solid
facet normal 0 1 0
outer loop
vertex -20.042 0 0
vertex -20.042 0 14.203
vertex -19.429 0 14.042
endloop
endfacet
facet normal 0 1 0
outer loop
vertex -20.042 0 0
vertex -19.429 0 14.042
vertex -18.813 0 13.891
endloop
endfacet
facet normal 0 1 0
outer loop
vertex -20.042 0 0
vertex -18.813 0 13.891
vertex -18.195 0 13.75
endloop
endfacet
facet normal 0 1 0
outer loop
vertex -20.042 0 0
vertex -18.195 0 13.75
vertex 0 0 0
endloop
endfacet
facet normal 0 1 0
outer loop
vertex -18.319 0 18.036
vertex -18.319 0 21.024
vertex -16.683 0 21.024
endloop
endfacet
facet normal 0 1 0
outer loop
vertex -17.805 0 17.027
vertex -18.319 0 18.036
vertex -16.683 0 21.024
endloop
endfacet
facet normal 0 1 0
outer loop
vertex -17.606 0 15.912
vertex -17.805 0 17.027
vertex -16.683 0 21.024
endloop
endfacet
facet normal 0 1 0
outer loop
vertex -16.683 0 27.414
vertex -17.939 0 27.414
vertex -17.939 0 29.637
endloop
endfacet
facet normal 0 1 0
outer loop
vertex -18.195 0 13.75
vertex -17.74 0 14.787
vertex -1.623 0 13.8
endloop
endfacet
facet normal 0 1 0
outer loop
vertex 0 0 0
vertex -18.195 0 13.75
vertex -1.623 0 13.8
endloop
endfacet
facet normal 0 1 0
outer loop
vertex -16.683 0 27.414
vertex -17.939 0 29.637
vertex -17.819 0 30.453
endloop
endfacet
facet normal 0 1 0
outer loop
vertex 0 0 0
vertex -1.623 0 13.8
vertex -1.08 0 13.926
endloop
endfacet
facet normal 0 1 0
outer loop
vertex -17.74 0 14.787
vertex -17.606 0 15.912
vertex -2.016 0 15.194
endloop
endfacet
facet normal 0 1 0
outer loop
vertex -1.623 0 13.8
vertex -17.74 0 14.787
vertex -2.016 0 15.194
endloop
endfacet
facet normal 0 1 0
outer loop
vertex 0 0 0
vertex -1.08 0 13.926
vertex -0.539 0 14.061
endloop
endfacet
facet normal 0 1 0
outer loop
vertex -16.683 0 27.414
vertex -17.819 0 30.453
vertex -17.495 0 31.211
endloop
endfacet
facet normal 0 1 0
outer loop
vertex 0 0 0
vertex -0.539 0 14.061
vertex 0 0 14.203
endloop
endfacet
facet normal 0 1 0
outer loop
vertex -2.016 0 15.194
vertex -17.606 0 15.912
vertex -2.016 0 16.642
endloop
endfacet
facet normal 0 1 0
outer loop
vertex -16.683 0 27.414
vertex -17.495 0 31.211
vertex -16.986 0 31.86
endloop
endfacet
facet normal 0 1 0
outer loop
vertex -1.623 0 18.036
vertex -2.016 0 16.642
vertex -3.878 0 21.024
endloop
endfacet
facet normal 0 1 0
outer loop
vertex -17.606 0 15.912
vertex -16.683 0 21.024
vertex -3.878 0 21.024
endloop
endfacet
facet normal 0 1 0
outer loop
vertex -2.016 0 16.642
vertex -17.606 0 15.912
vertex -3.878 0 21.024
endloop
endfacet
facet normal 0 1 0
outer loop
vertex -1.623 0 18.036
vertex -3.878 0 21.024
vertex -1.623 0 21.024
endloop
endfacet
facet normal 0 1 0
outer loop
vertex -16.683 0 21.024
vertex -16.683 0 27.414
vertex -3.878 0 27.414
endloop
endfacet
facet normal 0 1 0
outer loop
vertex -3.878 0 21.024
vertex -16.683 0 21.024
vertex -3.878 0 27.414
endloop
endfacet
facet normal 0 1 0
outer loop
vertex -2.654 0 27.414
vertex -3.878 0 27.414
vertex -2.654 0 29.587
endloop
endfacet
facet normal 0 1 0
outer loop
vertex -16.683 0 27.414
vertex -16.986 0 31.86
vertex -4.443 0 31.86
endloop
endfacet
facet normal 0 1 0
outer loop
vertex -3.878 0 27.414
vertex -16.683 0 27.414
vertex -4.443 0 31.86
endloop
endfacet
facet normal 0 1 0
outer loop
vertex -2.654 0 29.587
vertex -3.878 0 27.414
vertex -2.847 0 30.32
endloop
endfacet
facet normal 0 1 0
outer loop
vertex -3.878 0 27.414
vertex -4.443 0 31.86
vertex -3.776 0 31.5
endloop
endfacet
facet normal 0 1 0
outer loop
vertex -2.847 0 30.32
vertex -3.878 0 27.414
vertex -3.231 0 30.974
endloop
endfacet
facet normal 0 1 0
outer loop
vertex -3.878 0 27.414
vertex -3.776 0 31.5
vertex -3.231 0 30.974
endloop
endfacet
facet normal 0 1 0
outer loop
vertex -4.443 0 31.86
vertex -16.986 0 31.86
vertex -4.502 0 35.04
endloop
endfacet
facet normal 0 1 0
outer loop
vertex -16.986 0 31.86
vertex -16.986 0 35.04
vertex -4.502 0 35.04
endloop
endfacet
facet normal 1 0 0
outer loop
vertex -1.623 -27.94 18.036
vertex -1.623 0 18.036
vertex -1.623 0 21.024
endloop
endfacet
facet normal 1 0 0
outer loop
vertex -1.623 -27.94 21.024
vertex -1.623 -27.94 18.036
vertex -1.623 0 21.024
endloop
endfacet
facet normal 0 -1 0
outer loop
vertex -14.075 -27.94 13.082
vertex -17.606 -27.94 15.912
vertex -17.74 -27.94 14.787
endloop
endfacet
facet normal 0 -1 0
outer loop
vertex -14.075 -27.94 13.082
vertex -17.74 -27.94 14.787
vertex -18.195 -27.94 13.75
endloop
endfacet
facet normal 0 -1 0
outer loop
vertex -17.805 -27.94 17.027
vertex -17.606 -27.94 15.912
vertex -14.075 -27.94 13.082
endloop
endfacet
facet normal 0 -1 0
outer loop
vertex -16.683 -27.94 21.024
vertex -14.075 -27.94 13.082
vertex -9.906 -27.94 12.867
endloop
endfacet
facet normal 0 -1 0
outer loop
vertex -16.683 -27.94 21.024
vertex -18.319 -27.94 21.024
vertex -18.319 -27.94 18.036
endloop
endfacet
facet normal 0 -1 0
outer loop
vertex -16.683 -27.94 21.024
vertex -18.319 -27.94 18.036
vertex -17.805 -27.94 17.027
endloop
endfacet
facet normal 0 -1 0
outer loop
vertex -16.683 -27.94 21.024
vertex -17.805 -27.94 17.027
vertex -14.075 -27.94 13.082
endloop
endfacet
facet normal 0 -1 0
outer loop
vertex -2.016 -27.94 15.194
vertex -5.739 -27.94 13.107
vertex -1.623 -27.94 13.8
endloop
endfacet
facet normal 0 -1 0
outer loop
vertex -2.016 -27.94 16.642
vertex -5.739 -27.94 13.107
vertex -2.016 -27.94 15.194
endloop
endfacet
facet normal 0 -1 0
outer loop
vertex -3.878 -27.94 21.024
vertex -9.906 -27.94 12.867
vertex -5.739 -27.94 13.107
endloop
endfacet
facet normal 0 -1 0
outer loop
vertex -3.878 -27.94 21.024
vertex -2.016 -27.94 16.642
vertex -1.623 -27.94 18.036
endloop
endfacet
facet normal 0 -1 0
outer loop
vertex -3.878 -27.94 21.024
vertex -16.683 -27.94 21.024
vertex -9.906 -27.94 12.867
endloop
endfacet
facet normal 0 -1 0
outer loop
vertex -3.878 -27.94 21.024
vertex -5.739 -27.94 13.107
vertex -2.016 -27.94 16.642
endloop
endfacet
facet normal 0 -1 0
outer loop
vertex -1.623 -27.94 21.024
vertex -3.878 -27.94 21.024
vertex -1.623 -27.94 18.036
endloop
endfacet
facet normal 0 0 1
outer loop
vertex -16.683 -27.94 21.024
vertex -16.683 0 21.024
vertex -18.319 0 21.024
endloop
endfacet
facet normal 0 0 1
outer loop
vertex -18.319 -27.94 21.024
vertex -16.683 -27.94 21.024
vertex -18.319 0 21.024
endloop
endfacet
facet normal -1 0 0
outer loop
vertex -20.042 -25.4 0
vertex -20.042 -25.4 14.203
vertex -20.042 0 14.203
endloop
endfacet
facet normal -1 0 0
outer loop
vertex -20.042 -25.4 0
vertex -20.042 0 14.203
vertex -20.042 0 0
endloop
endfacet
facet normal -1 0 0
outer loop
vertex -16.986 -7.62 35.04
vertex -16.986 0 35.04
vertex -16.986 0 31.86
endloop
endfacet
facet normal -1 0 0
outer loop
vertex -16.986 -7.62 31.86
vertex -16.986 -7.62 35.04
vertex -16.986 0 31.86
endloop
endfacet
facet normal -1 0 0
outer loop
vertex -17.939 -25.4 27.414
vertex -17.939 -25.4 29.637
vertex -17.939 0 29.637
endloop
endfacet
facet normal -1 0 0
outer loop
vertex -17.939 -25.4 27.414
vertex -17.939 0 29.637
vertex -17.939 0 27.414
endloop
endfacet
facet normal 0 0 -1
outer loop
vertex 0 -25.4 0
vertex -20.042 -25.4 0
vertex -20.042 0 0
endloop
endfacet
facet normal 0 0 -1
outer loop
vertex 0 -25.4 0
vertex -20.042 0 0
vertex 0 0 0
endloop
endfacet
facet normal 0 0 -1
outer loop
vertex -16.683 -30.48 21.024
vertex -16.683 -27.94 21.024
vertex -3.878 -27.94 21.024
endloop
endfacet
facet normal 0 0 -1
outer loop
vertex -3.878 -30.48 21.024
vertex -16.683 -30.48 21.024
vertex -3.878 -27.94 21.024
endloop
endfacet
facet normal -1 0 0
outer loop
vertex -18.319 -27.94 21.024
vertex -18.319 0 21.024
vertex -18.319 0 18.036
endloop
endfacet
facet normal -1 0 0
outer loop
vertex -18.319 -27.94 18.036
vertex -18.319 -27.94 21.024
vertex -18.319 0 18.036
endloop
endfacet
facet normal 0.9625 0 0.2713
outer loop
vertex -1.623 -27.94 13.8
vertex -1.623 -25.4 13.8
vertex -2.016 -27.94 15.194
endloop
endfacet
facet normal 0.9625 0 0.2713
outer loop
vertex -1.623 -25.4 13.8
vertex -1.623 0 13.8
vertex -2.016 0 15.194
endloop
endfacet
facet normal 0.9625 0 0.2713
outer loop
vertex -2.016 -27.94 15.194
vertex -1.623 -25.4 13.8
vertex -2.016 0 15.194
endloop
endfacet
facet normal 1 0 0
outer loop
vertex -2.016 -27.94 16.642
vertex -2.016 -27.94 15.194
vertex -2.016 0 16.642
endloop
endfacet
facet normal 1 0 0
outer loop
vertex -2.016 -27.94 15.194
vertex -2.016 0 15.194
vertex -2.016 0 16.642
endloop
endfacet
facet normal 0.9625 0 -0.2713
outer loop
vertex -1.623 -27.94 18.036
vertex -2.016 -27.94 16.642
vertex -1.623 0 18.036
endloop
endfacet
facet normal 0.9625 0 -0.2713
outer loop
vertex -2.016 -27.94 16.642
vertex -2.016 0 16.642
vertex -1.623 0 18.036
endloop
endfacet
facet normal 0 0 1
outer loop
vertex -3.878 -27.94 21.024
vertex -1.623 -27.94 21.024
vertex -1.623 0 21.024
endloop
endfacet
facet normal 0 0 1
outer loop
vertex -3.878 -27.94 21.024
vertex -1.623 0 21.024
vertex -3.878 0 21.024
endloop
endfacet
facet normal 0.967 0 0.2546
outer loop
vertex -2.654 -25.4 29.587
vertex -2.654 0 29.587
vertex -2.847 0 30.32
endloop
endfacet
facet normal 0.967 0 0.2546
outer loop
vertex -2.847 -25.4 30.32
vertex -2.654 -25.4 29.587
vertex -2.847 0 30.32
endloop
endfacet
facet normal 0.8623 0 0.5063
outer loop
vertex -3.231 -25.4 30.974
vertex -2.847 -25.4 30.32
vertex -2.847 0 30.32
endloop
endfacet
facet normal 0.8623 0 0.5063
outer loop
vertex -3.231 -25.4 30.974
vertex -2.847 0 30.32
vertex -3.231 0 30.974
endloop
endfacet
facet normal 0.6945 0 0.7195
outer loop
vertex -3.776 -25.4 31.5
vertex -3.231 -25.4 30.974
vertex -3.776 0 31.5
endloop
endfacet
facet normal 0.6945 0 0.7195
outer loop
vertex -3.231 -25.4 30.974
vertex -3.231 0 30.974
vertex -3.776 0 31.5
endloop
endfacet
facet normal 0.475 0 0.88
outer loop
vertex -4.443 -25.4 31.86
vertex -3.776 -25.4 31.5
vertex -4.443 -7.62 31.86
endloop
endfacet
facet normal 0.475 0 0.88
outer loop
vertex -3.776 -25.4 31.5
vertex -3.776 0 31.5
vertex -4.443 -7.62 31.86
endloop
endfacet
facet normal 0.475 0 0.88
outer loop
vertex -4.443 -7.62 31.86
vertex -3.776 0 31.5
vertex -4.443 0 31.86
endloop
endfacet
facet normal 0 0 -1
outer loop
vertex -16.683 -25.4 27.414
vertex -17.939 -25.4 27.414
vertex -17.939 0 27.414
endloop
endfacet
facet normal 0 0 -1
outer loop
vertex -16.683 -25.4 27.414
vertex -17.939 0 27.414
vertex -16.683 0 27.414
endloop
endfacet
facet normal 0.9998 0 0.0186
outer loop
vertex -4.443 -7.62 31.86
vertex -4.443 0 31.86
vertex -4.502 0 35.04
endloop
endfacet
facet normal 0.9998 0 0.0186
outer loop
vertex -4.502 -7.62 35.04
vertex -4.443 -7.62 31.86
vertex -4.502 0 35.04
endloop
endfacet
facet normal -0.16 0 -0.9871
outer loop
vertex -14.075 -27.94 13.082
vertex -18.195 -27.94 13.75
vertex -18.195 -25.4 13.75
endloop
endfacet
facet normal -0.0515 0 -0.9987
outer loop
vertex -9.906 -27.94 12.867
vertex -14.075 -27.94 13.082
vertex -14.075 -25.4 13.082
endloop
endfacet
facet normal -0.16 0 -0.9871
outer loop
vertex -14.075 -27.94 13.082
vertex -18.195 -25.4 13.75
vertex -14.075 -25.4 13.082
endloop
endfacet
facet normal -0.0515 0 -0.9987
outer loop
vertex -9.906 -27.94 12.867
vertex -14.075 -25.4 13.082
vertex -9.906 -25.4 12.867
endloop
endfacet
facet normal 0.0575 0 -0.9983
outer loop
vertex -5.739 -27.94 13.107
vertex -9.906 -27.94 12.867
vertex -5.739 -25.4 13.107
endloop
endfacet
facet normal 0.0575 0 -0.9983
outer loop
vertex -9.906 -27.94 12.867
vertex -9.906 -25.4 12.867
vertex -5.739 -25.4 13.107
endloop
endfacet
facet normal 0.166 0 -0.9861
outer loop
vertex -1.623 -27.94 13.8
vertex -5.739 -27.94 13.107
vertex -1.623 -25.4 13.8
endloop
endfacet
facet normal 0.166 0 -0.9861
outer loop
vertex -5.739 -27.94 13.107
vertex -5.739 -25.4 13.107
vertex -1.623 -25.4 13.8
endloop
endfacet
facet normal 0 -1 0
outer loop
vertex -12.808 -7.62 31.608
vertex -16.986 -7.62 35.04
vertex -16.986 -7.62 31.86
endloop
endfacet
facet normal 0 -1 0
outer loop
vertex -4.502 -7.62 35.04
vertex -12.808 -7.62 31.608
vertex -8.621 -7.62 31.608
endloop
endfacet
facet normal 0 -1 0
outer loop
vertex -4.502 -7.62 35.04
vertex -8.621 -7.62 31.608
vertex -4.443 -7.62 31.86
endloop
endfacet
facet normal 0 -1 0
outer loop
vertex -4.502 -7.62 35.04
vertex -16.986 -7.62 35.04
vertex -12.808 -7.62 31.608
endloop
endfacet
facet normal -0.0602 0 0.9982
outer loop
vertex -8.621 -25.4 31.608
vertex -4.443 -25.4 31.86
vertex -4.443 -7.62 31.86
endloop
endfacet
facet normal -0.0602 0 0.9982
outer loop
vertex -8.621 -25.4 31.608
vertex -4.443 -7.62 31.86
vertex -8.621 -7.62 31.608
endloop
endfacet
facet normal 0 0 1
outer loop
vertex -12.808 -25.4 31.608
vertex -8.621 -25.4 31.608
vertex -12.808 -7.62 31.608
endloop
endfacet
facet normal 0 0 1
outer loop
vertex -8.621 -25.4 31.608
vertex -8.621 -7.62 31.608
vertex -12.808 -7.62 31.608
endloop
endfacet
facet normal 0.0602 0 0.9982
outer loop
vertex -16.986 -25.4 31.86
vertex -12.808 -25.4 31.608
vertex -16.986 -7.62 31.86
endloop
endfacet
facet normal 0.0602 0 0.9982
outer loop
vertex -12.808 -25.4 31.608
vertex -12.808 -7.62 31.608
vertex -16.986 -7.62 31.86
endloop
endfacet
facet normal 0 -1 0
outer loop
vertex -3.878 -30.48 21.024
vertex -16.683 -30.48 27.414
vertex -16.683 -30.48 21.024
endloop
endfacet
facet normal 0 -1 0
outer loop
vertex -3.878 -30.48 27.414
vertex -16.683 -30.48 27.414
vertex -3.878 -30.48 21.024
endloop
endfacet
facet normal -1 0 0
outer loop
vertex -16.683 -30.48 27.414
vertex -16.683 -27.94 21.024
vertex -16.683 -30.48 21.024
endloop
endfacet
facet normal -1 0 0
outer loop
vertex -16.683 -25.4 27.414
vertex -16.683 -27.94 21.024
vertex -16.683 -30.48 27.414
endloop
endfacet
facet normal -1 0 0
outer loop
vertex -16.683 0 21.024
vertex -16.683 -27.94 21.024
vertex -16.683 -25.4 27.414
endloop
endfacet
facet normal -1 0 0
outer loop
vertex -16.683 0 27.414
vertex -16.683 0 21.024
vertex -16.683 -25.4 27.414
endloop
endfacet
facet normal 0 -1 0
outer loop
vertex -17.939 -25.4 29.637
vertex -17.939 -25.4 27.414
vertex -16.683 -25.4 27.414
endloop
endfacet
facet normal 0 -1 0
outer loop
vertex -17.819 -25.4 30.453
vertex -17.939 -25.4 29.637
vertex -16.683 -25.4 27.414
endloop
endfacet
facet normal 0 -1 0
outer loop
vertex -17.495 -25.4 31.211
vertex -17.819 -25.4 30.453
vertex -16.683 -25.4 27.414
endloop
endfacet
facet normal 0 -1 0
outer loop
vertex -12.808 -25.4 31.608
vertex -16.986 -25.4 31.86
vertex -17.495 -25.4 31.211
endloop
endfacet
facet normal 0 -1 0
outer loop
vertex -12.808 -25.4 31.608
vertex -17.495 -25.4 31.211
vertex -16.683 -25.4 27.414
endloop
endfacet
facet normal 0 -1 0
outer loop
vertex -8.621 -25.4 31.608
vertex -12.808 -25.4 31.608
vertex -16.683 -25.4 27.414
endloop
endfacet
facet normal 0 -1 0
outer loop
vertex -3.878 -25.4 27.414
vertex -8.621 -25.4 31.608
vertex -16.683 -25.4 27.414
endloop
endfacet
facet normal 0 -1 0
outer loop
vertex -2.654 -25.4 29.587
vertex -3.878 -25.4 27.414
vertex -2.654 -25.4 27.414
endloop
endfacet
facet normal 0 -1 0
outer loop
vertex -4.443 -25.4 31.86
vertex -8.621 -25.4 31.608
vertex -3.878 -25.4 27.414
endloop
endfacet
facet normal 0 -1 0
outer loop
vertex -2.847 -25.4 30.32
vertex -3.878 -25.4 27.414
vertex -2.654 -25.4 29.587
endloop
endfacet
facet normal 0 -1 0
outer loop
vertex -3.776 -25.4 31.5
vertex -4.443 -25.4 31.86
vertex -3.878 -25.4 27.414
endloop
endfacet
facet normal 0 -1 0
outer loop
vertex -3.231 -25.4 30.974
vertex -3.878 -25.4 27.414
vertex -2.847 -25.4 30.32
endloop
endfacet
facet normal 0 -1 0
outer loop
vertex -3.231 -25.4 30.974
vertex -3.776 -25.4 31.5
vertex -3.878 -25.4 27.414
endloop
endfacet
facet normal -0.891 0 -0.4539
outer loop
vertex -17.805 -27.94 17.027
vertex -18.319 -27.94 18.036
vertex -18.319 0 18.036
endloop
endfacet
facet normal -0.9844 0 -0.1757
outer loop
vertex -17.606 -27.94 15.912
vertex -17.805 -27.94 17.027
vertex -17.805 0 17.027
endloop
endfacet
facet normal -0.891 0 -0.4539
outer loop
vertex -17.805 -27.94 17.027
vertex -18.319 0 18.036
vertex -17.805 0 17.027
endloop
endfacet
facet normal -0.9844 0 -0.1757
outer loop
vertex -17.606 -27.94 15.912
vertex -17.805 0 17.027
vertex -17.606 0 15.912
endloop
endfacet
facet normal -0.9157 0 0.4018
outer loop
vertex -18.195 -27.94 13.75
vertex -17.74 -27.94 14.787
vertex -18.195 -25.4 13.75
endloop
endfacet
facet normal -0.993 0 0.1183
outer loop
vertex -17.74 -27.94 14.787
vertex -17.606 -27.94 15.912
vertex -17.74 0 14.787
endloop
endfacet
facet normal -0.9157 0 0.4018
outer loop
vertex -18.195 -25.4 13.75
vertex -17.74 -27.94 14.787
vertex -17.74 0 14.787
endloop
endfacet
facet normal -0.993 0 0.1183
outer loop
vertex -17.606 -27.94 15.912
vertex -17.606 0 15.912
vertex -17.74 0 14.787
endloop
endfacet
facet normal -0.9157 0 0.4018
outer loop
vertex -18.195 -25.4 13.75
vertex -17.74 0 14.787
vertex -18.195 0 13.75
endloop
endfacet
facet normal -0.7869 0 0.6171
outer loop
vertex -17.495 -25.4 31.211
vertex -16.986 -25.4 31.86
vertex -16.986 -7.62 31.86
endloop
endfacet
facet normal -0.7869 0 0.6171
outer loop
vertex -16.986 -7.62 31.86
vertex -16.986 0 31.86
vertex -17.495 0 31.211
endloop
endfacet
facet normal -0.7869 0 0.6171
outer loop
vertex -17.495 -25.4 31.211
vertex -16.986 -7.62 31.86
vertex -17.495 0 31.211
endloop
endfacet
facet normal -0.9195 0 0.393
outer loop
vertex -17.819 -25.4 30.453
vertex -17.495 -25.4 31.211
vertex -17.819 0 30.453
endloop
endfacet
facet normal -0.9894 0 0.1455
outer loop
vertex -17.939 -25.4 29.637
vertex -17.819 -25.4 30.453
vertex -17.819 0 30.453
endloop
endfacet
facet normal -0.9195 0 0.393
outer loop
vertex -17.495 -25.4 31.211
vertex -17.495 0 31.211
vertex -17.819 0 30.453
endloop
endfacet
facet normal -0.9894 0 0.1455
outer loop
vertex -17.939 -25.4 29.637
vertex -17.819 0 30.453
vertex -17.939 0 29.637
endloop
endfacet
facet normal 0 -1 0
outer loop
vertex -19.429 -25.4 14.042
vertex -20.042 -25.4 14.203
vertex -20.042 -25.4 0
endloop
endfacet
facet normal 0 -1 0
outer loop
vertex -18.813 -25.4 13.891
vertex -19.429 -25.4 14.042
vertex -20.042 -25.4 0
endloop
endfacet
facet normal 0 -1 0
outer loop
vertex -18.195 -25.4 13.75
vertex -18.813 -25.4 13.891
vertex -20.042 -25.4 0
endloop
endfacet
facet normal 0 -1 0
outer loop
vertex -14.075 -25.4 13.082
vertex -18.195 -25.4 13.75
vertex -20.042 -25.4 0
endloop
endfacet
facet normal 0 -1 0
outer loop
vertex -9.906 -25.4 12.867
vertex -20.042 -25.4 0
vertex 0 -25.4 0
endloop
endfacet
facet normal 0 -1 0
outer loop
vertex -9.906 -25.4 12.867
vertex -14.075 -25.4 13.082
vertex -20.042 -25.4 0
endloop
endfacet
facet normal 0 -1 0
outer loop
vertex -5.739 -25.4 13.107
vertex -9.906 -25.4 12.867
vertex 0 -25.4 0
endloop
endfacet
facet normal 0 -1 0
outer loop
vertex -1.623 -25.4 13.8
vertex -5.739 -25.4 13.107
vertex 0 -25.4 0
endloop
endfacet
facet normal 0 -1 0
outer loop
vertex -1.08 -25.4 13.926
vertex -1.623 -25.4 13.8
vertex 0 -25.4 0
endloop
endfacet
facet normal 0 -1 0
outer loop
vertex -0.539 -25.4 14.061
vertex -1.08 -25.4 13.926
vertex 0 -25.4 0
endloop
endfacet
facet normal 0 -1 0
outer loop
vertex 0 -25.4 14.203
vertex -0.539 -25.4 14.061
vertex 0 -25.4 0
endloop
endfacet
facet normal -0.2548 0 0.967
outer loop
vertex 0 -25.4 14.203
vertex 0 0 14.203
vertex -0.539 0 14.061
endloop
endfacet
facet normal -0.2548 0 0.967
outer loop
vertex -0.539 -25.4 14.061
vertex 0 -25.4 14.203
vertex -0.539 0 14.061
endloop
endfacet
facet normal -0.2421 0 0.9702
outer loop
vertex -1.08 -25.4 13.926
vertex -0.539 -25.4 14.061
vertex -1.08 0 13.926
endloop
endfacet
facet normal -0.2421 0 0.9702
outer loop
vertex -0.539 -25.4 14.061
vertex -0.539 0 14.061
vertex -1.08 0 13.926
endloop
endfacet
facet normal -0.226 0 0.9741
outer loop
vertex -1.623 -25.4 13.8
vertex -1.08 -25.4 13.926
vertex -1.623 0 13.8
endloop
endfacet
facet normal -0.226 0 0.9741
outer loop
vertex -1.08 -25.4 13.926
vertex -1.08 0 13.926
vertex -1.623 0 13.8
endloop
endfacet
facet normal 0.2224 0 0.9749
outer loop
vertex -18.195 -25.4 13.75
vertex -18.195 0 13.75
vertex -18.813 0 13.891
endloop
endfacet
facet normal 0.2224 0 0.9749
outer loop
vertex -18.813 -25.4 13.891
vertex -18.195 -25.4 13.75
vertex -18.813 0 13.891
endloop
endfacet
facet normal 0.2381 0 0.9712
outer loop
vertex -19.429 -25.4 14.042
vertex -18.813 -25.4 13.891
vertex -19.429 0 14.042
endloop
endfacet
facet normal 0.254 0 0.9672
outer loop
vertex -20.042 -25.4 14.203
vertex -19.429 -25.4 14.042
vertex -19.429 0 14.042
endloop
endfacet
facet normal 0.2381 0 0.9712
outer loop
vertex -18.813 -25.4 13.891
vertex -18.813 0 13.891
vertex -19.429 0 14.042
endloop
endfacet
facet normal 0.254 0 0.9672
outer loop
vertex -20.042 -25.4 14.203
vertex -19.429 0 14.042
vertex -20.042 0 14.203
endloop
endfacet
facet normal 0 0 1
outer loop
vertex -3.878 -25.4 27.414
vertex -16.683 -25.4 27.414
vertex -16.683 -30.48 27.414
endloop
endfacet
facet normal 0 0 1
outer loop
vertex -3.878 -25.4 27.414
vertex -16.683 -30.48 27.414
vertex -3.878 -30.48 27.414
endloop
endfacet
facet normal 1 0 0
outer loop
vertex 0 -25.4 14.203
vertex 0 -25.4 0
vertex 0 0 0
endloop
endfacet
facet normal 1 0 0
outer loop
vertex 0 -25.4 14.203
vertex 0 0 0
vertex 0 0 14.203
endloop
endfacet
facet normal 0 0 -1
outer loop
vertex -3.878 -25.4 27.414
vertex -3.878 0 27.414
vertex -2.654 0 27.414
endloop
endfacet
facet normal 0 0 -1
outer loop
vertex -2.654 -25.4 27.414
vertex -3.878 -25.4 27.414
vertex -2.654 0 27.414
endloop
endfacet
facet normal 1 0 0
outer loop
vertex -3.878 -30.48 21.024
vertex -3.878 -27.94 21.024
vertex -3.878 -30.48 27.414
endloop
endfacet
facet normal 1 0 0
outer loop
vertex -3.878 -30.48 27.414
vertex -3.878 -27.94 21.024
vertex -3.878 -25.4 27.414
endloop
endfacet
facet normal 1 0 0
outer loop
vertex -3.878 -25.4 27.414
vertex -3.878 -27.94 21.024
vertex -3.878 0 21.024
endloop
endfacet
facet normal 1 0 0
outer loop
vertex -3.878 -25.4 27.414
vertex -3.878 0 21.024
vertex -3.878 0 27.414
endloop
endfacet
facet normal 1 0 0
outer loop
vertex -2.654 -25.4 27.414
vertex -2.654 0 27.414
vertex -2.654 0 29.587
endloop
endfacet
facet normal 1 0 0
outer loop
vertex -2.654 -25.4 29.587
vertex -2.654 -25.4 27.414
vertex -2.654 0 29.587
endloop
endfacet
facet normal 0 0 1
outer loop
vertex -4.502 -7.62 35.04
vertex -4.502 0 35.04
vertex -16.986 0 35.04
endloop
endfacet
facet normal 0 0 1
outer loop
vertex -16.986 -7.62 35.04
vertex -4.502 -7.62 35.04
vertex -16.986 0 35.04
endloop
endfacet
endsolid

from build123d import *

# Parameters (mm, degrees)
F1_DEPTH = 25.4
F2_DEPTH = 27.94
F0_W     = 12.805208
F0_H     = 6.38972
F3_DEPTH = 30.48
F4_DEPTH = 25.4
F5_DEPTH = 7.62


with BuildPart() as f1:
    # F0 (on Front) → F1 (new body)
    with BuildSketch(Plane.XZ):
        with BuildLine():
            Line((-20.041954, 0), (0, 0))
            Line((0, 0), (0, 14.202959))
            ThreePointArc((0, 14.202959), (-0.809395, 13.992635), (-1.623196, 13.800062))
            ThreePointArc((-1.623196, 13.800062), (-9.906257, 12.866678), (-18.194769, 13.750344))
            ThreePointArc((-18.194769, 13.750344), (-19.121176, 13.965165), (-20.041954, 14.202959))
            Line((-20.041954, 14.202959), (-20.041954, 0))
        make_face()
    extrude(amount=F1_DEPTH)

    # F0 (on Front) → F2 (join)
    with BuildSketch(Plane.XZ):
        with BuildLine():
            ThreePointArc((-18.194769, 13.750344), (-9.906257, 12.866678), (-1.623196, 13.800062))
            ThreePointArc((-1.623196, 13.800062), (-2.065342, 15.917783), (-1.623196, 18.035505))
            Line((-1.623196, 18.035505), (-1.623196, 21.024244))
            Line((-1.623196, 21.024244), (-3.877633, 21.024244))
            Line((-3.877633, 21.024244), (-16.682841, 21.024244))
            Line((-16.682841, 21.024244), (-18.318918, 21.024244))
            Line((-18.318918, 21.024244), (-18.318918, 18.035505))
            ThreePointArc((-18.318918, 18.035505), (-17.605755, 15.911787), (-18.194769, 13.750344))
        make_face()
    extrude(amount=F2_DEPTH)

    # F0 (on Front) → F3 (join)
    with BuildSketch(Plane.XZ):
        with Locations((-10.280237, 24.219104)):
            Rectangle(F0_W, F0_H)
    extrude(amount=F3_DEPTH)

    # F0 (on Front) → F4 (join)
    with BuildSketch(Plane.XZ):
        with BuildLine():
            Line((-16.682841, 27.413964), (-3.877633, 27.413964))
            Line((-3.877633, 27.413964), (-2.653796, 27.413964))
            Line((-2.653796, 27.413964), (-2.653796, 29.587325))
            ThreePointArc((-2.653796, 29.587325), (-3.230513, 30.973826), (-4.442622, 31.860266))
            ThreePointArc((-4.442622, 31.860266), (-10.714561, 31.576369), (-16.986499, 31.860266))
            ThreePointArc((-16.986499, 31.860266), (-17.681629, 30.842499), (-17.938741, 29.637115))
            Line((-17.938741, 29.637115), (-17.938741, 27.413964))
            Line((-17.938741, 27.413964), (-16.682841, 27.413964))
        make_face()
    extrude(amount=F4_DEPTH)

    # F0 (on Front) → F5 (join)
    with BuildSketch(Plane.XZ):
        with BuildLine():
            ThreePointArc((-16.986499, 31.860266), (-10.714561, 31.576369), (-4.442622, 31.860266))
            Line((-4.442622, 31.860266), (-4.501514, 35.040405))
            Line((-4.501514, 35.040405), (-16.986499, 35.040405))
            Line((-16.986499, 35.040405), (-16.986499, 34.039252))
            Line((-16.986499, 34.039252), (-16.986499, 31.860266))
        make_face()
    extrude(amount=F5_DEPTH)


solid = f1.part
